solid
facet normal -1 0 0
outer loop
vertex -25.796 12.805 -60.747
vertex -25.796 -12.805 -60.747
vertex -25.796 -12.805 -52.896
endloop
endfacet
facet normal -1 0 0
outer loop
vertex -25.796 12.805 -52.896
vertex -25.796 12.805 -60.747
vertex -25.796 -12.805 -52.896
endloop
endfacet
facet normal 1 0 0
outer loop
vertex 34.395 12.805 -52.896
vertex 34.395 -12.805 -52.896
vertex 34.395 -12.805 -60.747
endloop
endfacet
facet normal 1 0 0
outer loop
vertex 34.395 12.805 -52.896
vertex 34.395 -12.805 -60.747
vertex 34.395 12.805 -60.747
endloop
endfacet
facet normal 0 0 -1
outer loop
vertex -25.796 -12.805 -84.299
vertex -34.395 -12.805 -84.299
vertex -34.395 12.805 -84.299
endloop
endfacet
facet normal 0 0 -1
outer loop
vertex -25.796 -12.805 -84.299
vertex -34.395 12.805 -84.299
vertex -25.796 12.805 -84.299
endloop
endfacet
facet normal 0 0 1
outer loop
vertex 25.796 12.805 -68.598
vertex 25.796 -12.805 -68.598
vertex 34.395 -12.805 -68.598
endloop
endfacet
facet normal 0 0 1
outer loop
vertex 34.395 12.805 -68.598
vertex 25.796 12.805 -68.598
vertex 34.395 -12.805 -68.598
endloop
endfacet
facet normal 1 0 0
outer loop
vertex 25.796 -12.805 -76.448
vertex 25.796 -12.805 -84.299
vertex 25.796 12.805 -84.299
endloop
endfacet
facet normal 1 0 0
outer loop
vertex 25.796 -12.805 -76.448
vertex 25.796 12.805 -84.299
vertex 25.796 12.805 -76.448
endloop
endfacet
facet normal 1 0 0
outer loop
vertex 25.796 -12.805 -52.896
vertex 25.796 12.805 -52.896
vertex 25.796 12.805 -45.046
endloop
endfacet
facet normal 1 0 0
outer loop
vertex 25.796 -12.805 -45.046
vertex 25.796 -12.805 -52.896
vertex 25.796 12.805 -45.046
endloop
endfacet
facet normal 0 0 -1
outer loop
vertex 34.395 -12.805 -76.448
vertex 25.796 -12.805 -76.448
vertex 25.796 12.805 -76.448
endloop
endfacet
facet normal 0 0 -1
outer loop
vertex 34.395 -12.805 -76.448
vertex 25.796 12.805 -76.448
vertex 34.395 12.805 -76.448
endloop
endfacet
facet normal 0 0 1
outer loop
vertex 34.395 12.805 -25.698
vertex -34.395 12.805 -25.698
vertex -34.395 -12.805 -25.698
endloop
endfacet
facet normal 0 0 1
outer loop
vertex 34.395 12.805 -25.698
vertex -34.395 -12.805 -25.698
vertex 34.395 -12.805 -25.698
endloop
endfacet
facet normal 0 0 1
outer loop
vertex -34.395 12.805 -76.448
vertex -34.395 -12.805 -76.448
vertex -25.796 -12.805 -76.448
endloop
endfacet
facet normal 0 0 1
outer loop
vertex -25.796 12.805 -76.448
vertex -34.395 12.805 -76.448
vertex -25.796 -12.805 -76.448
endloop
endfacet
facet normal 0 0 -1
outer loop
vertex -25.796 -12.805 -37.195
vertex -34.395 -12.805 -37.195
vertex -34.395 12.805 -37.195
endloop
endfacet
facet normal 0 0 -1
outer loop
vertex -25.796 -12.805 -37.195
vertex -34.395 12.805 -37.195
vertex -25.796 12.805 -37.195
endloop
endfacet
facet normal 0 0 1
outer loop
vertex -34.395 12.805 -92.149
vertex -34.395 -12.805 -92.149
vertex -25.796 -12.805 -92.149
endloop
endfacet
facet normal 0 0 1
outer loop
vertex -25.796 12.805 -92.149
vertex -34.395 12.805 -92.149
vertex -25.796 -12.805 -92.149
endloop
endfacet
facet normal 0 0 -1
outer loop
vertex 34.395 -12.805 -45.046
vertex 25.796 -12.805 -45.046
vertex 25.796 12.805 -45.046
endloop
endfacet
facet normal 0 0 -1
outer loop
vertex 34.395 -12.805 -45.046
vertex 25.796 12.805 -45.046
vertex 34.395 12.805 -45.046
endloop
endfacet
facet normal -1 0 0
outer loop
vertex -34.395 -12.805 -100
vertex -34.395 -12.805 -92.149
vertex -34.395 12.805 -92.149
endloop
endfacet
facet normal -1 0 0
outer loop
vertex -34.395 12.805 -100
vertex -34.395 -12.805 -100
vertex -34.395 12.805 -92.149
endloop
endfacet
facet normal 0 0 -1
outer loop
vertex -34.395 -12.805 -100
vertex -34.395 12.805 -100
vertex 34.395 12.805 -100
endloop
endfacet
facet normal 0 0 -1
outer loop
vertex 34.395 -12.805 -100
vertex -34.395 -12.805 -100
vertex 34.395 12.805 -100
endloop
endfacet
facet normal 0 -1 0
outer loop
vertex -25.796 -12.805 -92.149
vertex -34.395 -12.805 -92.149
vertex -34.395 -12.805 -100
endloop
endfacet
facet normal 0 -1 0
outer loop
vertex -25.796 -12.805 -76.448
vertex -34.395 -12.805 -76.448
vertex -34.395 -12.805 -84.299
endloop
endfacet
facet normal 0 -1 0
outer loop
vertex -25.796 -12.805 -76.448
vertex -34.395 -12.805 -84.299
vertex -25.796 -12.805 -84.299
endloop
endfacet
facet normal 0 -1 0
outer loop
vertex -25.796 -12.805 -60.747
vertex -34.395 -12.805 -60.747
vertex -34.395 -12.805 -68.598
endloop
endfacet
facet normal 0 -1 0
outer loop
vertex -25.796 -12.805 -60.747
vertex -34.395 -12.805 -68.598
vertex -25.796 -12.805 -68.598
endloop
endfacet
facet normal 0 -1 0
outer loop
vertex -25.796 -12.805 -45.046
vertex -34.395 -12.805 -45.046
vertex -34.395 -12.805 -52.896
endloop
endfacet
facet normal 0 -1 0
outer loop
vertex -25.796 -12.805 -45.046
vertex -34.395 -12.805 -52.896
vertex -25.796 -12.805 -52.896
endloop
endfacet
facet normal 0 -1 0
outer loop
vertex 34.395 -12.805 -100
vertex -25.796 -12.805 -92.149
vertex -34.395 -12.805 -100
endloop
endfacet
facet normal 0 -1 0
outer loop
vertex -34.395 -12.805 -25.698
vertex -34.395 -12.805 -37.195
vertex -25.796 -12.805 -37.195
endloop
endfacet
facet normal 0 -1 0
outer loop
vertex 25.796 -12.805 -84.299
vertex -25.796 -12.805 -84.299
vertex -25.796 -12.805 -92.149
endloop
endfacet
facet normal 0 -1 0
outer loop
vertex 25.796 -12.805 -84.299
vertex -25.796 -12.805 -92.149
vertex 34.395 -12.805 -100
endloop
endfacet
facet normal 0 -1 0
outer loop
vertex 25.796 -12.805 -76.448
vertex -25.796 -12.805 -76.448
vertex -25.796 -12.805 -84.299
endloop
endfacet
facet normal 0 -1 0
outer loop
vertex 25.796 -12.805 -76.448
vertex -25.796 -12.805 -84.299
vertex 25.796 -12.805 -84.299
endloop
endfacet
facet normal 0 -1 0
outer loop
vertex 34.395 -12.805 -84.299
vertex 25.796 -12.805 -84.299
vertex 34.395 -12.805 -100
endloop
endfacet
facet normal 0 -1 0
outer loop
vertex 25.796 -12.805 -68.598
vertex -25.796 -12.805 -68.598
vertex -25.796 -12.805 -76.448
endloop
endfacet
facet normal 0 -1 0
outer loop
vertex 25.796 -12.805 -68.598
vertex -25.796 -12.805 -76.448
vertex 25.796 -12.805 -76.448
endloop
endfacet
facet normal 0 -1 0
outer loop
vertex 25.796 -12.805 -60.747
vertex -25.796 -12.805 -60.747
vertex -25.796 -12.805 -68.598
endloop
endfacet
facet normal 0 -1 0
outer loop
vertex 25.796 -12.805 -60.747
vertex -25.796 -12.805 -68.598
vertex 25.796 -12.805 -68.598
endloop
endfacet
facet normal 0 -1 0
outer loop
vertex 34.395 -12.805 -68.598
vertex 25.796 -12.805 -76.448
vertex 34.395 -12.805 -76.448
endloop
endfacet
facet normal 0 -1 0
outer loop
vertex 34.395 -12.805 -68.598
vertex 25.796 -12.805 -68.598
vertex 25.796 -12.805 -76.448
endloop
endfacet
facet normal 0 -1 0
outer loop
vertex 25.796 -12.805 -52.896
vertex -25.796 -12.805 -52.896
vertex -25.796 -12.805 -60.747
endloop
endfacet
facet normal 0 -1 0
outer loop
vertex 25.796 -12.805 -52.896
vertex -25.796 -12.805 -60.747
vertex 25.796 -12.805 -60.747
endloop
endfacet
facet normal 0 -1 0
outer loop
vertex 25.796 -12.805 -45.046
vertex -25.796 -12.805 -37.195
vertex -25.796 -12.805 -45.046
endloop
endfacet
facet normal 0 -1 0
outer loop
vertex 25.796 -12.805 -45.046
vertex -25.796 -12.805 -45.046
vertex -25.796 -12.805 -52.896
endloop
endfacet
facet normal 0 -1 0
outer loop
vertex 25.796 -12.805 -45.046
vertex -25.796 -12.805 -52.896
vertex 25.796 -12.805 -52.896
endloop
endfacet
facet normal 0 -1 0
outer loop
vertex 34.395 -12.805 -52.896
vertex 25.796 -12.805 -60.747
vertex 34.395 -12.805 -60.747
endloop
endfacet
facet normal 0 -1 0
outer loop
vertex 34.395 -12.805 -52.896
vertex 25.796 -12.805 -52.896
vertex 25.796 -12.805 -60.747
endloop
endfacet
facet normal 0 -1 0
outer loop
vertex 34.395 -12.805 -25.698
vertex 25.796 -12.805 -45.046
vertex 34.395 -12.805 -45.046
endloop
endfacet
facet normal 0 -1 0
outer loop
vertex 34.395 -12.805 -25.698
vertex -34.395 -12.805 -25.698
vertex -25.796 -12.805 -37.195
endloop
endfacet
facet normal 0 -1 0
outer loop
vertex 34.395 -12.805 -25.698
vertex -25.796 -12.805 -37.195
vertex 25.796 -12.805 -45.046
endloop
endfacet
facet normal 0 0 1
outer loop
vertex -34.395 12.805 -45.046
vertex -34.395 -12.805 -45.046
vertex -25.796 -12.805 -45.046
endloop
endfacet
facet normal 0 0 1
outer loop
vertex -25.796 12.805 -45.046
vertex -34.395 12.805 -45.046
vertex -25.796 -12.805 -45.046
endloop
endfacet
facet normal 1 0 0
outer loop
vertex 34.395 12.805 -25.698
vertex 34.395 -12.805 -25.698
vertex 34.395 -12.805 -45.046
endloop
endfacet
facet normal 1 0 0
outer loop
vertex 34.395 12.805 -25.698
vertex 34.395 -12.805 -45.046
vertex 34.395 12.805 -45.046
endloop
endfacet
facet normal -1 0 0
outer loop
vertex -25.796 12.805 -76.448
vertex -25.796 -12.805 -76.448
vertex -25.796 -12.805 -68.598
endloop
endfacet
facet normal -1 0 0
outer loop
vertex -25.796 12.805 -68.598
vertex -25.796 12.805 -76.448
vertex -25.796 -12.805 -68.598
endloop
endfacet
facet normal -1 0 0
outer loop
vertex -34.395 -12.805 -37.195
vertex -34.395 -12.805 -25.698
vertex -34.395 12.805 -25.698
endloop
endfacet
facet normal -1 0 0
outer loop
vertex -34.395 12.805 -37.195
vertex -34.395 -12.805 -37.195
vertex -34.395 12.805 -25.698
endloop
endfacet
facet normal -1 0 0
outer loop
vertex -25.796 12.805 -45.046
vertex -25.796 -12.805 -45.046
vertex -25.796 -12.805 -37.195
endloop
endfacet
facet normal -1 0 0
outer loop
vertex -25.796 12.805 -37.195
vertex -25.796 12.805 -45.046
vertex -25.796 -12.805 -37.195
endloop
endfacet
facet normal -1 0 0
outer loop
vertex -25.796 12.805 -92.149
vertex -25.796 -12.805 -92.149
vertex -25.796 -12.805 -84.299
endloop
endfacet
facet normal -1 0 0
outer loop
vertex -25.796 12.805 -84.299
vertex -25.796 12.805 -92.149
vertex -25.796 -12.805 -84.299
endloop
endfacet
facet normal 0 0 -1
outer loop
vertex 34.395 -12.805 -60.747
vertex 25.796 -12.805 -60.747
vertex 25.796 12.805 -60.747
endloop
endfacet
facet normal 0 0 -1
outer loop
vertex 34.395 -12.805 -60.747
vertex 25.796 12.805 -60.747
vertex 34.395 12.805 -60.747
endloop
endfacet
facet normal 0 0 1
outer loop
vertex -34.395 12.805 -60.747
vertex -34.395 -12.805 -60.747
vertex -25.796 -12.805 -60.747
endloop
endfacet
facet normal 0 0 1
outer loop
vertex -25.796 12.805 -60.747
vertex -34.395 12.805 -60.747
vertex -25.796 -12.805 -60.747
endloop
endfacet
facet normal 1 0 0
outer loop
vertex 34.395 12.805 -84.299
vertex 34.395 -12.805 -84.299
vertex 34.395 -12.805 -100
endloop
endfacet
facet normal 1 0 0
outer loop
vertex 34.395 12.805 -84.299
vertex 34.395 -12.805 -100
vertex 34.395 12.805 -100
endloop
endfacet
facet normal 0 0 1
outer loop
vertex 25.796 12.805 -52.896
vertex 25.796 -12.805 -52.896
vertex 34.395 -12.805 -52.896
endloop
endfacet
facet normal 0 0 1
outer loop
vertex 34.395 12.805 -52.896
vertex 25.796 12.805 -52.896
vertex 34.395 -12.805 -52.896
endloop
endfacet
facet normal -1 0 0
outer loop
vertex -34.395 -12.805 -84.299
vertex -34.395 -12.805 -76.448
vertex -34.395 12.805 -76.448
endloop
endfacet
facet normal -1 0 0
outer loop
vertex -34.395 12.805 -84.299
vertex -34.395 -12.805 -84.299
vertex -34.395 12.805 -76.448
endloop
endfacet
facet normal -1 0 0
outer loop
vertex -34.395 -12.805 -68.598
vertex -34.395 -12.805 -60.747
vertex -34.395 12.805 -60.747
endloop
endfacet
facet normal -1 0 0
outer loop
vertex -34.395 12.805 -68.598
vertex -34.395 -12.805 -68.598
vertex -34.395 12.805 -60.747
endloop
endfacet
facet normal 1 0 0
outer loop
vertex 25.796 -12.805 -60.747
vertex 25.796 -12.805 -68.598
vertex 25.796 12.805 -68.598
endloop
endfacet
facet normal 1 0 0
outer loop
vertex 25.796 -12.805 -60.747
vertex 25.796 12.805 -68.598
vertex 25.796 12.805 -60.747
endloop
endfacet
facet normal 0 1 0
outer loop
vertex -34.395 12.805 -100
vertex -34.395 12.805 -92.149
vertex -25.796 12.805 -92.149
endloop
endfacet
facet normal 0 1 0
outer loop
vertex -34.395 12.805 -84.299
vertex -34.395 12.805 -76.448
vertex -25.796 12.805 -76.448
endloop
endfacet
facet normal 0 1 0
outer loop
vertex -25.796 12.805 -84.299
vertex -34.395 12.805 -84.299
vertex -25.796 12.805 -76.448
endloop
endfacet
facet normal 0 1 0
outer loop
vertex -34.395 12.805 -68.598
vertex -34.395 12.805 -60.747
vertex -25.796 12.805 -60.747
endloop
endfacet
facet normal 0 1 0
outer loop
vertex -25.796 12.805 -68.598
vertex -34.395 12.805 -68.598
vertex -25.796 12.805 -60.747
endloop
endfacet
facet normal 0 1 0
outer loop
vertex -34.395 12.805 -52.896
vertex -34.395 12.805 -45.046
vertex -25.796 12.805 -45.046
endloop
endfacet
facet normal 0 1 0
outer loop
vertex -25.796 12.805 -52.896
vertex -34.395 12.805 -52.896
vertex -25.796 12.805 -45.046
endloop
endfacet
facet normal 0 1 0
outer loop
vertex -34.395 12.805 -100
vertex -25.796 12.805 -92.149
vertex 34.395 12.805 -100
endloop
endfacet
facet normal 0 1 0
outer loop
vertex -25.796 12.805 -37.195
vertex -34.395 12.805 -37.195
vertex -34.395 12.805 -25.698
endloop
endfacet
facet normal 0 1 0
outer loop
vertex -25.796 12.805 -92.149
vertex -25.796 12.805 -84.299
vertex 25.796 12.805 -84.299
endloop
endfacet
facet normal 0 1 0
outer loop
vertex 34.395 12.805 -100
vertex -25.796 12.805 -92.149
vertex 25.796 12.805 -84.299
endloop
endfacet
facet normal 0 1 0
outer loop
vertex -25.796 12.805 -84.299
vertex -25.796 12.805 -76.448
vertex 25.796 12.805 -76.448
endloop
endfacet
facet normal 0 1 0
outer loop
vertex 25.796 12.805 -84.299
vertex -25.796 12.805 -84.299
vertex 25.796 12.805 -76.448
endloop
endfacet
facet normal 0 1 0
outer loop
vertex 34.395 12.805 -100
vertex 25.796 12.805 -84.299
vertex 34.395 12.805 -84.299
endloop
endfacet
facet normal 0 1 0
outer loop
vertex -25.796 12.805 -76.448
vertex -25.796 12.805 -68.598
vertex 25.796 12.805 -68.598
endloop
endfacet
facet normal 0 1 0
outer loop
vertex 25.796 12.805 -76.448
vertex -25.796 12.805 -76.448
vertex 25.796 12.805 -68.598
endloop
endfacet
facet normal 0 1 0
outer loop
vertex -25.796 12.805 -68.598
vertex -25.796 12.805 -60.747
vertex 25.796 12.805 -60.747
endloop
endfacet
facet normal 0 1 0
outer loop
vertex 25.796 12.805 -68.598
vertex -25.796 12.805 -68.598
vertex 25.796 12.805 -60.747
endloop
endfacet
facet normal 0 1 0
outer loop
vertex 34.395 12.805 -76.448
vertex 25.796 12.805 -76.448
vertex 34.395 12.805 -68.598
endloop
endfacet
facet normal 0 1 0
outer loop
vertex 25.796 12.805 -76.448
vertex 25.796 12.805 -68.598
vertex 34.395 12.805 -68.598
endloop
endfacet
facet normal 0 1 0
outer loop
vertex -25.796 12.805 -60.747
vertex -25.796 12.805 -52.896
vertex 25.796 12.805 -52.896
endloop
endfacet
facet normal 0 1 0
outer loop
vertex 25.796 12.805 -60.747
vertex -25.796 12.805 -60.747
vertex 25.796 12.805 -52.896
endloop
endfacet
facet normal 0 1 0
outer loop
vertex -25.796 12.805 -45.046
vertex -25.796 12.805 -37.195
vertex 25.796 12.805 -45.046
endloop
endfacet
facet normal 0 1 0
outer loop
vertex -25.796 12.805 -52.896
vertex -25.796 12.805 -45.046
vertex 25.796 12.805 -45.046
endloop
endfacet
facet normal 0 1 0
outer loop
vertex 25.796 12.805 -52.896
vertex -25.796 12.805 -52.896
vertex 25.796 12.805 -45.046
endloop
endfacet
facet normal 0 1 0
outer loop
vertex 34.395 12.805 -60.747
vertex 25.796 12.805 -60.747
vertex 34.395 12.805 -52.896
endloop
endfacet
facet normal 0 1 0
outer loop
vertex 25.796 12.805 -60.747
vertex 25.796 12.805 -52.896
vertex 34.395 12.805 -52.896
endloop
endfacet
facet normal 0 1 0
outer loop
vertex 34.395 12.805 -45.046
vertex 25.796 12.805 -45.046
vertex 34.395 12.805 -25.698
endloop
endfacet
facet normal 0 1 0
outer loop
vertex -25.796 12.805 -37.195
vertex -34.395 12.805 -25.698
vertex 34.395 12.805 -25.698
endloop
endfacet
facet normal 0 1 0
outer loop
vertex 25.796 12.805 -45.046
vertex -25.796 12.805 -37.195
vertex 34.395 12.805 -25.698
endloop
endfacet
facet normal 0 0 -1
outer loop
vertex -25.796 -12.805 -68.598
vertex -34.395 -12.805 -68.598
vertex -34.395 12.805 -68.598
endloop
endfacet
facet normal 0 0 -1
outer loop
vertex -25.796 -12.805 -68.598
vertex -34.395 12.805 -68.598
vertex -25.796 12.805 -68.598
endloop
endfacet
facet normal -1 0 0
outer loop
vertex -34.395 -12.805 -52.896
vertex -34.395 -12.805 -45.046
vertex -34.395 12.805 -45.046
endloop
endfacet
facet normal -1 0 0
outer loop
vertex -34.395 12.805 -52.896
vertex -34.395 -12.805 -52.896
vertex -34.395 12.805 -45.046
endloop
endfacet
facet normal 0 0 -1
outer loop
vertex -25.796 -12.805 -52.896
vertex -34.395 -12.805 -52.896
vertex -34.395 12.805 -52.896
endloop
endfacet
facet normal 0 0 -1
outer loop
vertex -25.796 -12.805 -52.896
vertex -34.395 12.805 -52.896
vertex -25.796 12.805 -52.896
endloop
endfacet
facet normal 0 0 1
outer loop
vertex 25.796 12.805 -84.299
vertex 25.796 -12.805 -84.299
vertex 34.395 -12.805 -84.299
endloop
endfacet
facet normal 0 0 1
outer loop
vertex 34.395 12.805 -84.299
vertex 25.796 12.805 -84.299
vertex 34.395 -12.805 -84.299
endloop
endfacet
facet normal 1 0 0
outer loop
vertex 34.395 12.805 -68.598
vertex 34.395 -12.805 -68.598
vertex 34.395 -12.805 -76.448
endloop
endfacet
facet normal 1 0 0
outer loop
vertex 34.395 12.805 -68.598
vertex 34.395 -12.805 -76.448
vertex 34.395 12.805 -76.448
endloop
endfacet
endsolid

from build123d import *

# Parameters (mm, degrees)
F0_W     = 68.79
F0_H     = 25.61
F1_DEPTH = 25.61
F2_DEPTH = 100
F3_W     = 8.59875
F3_H     = 7.850625
F4_DEPTH = 50
F5_DEPTH = 51.308


with BuildPart() as f1:
    # F0 (on Top) → F1 (new body)
    with BuildSketch(Plane.XY):
        Rectangle(F0_W, F0_H)
    extrude(amount=F1_DEPTH)

    # F2 (add): a face of the model
    f2_faces = [f1.faces().sort_by_distance(p)[0] for p in [
        (0, 0, 0),
    ]]
    extrude(f2_faces, amount=F2_DEPTH)

    # F3 (on face) → F4 (cut)
    with BuildSketch(Plane.XZ.offset(12.805)):
        with Locations((-30.095625, -41.1203125)):
            Rectangle(F3_W, F3_H)
        with Locations((30.095625, -48.9709375)):
            Rectangle(F3_W, F3_H)
        with Locations((-30.095625, -56.8215625)):
            Rectangle(F3_W, F3_H)
        with Locations((30.095625, -64.6721875)):
            Rectangle(F3_W, F3_H)
        with Locations((-30.095625, -72.5228125)):
            Rectangle(F3_W, F3_H)
        with Locations((30.095625, -80.3734375)):
            Rectangle(F3_W, F3_H)
        with Locations((-30.095625, -88.2240625)):
            Rectangle(F3_W, F3_H)
    extrude(amount=-F4_DEPTH, mode=Mode.SUBTRACT)

    # F5 (cut): a face of the model
    f5_faces = [f1.faces().sort_by_distance(p)[0] for p in [
        (0, 0, 25.61),
    ]]
    extrude(f5_faces, amount=-F5_DEPTH, mode=Mode.SUBTRACT)


solid = f1.part
